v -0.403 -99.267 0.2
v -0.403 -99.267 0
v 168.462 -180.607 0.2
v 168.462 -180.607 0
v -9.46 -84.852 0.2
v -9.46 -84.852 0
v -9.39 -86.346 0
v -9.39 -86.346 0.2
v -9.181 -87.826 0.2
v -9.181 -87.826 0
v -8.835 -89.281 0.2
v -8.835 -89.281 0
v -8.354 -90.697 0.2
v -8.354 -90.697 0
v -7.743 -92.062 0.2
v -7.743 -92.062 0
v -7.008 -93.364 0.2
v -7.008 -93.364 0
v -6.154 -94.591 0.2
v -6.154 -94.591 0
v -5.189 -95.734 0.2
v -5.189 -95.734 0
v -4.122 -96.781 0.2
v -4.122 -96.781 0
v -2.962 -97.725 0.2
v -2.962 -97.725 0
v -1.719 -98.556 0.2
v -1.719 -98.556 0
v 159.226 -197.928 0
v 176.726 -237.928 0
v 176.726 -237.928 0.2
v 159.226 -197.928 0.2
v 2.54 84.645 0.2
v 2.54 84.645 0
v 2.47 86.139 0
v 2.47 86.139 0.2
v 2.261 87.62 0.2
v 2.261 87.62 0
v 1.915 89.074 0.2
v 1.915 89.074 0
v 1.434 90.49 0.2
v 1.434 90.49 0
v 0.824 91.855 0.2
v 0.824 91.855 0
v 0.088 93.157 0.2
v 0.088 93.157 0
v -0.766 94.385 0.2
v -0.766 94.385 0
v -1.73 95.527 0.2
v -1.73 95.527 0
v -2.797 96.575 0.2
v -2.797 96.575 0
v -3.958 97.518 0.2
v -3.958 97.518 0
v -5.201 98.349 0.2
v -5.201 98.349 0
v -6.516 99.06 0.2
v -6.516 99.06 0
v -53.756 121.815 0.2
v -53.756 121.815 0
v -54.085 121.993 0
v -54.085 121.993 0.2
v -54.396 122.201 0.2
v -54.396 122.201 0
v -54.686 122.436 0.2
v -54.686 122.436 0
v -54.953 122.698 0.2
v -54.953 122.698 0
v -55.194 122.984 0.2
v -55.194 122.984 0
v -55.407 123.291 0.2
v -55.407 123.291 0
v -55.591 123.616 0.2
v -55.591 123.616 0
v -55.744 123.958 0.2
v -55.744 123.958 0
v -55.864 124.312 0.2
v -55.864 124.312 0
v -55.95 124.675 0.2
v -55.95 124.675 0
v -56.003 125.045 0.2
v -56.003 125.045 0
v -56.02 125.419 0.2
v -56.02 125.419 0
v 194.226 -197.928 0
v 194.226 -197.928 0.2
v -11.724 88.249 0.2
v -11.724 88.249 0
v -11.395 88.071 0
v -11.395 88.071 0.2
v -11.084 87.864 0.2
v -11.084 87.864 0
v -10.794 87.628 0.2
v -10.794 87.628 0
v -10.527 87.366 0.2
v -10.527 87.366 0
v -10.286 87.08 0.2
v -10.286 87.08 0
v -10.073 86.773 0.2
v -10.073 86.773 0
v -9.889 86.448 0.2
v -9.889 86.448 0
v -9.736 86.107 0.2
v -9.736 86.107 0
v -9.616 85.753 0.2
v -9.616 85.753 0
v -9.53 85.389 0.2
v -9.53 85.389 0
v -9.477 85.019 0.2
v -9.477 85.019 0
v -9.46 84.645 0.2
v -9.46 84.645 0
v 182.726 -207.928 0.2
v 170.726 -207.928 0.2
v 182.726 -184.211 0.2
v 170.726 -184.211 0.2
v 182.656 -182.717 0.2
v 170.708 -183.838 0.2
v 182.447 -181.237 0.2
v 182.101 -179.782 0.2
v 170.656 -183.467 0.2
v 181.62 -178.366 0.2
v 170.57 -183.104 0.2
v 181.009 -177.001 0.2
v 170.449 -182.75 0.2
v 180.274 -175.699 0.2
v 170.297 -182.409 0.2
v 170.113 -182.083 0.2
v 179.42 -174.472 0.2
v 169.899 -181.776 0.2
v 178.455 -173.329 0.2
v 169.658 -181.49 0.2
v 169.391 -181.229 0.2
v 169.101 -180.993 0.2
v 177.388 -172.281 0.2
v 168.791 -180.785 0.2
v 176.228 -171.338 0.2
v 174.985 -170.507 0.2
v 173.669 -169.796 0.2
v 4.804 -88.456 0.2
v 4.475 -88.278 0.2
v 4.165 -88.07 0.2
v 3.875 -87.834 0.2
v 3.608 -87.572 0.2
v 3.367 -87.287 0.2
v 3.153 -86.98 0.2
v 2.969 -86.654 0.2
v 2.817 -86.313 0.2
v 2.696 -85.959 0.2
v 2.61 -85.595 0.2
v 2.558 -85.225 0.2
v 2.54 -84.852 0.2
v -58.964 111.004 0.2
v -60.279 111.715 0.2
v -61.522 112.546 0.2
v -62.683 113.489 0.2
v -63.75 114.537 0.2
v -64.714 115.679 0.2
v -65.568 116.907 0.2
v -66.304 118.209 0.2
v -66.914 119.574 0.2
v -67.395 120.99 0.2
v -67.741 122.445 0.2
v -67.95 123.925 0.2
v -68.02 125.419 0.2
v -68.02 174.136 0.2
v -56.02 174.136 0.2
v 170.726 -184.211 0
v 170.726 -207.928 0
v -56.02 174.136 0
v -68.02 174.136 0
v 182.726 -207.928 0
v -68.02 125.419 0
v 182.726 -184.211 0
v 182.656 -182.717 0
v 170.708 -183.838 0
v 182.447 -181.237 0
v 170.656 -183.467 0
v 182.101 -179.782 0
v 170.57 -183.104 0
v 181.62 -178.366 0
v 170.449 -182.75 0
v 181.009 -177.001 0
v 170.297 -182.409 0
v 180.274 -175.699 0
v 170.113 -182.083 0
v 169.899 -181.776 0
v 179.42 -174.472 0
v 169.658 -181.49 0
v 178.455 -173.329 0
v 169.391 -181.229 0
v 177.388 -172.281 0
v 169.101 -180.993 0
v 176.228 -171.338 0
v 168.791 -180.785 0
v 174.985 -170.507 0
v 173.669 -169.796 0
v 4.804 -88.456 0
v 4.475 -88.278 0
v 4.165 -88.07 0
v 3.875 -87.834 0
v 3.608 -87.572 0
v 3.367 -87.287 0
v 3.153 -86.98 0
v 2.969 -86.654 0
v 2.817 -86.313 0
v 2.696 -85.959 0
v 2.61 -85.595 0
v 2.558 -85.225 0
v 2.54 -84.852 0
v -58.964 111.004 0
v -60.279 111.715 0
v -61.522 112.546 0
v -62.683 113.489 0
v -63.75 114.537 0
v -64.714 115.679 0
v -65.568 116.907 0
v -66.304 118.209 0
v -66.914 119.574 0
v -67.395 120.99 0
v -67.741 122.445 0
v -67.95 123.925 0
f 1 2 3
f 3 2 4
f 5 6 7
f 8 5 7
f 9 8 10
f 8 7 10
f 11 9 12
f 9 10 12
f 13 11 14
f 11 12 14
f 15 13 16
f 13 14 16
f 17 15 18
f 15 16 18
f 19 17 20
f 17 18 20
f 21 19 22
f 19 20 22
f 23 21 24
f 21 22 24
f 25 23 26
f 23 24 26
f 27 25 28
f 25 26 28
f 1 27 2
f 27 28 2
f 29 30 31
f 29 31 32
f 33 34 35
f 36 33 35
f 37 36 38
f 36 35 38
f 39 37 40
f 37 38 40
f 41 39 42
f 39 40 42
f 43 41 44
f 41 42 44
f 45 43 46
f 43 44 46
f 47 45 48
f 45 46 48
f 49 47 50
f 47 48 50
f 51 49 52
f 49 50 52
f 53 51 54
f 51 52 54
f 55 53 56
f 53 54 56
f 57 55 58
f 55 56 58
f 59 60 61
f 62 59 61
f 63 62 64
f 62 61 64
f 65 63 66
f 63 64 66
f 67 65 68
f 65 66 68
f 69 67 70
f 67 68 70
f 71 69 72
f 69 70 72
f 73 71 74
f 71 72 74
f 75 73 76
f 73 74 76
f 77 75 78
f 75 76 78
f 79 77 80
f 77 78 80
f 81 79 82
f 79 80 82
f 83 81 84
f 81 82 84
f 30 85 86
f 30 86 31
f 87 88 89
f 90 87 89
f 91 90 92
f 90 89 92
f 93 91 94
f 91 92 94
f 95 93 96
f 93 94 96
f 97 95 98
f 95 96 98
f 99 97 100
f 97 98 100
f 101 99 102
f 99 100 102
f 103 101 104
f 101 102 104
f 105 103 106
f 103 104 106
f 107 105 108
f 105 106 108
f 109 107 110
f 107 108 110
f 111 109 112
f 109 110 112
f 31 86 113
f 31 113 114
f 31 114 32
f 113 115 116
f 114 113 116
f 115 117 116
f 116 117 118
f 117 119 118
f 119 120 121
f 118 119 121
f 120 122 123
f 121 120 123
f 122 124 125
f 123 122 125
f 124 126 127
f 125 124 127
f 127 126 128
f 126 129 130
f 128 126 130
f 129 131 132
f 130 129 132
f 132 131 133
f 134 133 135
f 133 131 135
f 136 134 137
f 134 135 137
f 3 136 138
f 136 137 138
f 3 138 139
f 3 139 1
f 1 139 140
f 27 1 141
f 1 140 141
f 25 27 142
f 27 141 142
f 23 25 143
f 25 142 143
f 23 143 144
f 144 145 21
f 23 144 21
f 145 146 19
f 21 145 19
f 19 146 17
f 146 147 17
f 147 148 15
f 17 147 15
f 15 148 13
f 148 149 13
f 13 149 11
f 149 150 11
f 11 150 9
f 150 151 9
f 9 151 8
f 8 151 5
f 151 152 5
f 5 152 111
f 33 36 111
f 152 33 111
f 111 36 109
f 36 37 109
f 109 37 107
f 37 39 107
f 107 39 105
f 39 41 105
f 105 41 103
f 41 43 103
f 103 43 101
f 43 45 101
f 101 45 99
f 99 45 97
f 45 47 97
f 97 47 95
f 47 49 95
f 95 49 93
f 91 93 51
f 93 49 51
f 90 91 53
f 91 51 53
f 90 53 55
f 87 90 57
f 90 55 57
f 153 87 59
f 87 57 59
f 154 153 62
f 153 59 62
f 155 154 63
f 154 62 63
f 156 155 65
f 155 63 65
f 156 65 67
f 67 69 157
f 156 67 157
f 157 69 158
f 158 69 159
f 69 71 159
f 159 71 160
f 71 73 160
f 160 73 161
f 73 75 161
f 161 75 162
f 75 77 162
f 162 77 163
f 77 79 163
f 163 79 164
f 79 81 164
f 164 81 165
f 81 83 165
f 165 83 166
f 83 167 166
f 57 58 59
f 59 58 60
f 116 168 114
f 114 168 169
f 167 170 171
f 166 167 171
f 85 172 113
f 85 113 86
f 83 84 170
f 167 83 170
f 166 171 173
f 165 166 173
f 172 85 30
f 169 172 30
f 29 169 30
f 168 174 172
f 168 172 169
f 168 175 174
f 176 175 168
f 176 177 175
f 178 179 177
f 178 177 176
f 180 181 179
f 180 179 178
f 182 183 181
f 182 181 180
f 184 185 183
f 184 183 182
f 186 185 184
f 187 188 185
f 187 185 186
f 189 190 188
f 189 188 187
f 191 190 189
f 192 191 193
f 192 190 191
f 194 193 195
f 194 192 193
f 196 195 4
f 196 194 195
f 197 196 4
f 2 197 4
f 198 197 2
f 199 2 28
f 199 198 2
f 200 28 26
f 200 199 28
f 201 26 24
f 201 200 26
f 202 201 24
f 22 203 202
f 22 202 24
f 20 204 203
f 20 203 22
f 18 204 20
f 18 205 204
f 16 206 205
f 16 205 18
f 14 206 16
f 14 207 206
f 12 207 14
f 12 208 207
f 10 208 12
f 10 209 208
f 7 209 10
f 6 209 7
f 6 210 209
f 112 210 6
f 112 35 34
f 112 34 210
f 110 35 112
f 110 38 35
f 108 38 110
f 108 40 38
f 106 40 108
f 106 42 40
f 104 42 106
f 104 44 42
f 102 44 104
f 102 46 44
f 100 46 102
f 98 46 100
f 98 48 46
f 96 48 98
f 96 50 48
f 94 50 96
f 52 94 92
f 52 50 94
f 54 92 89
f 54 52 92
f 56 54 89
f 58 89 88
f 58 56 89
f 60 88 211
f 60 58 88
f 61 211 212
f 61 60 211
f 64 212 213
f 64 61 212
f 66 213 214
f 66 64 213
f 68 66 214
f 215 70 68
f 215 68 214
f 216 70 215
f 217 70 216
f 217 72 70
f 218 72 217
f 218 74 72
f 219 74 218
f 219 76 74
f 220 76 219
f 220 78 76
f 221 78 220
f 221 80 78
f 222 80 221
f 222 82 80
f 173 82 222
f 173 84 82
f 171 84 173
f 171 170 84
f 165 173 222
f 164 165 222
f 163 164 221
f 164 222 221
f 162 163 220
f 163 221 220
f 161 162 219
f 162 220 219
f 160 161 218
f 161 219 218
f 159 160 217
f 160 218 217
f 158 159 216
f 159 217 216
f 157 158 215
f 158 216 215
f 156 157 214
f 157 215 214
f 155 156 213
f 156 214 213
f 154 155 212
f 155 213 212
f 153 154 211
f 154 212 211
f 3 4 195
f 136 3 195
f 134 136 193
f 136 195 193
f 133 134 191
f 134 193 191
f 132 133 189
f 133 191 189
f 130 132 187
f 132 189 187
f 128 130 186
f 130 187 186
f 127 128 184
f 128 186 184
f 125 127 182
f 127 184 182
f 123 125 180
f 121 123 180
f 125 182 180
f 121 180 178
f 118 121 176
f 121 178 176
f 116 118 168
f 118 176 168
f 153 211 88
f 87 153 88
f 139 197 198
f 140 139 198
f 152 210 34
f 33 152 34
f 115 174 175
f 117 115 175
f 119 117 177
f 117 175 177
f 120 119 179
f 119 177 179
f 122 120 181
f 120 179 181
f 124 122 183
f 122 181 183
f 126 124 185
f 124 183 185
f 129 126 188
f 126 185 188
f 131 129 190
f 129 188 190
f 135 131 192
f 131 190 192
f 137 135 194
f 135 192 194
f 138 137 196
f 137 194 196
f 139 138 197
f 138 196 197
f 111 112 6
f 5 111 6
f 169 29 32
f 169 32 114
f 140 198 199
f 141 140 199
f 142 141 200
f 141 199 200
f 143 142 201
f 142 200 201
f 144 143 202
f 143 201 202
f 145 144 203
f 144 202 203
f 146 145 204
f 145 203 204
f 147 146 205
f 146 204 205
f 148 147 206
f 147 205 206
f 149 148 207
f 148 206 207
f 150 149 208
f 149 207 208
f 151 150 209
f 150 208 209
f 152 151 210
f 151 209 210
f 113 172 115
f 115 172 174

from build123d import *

# Parameters (mm, degrees)
EXTRU_MINCE1_DEPTH = 0.2
EXTRUSION1_DEPTH   = 0.2


with BuildPart() as part:
    # Esquisse2 → Extru.-Mince1 (new body)
    with BuildSketch(Plane.XY):
        with BuildLine():
            Line((-68.020160179, 174.136090676), (-68.020160179, 125.41885319))
            ThreePointArc((-68.020160179, 125.41885319), (-65.568146462, 116.906975155), (-58.963651719, 111.004002333))
            Line((-58.963651719, 111.004002333), (-11.723955687, 88.249106497))
            ThreePointArc((-11.723955686, 88.249106497), (-10.072832001, 86.773363292), (-9.459828571, 84.645393783))
            Line((-9.459828571, 84.645393783), (-9.459828571, -84.851832415))
            ThreePointArc((-9.459828571, -84.851832415), (-7.007814854, -93.36371045), (-0.403320111, -99.266683272))
            Line((-0.403320111, -99.266683272), (168.46168003, -180.607288974))
            ThreePointArc((168.46168003, -180.607288974), (170.112803715, -182.083032179), (170.725807145, -184.211001688))
            Line((170.725807145, -184.211001688), (170.725807145, -207.928239175))
            Line((170.725807145, -207.928239175), (182.725807145, -207.928239175))
            Line((182.725807145, -207.928239175), (182.725807145, -184.211001688))
            ThreePointArc((182.725807145, -184.211001688), (180.273793427, -175.699123653), (173.669298684, -169.796150831))
            Line((173.669298684, -169.796150831), (4.804298544, -88.455545129))
            ThreePointArc((4.804298544, -88.455545129), (3.153174858, -86.979801923), (2.540171429, -84.851832415))
            Line((2.540171429, -84.851832415), (2.540171429, 84.645393783))
            ThreePointArc((2.540171429, 84.645393783), (0.088157711, 93.157271818), (-6.516337032, 99.06024464))
            Line((-6.516337032, 99.06024464), (-53.756033064, 121.815140475))
            ThreePointArc((-53.756033064, 121.815140475), (-55.40715675, 123.290883681), (-56.020160179, 125.41885319))
            Line((-56.020160179, 125.41885319), (-56.020160179, 174.136090676))
            Line((-56.020160179, 174.136090676), (-68.020160179, 174.136090676))
        make_face()
    extrude(amount=EXTRU_MINCE1_DEPTH)

    # Esquisse3 → Extrusion1 (add)
    with BuildSketch(Plane(origin=(0, 0, 0), x_dir=(-1, 0, 0), z_dir=(0, 0, -1))):
        Polygon((-182.725807145, -207.928239175), (-194.225807145, -197.928239175), (-176.725807145, -237.928239175), (-159.225807145, -197.928239175), (-170.725807145, -207.928239175), align=None)
    extrude(amount=-EXTRUSION1_DEPTH)


solid = part.part
